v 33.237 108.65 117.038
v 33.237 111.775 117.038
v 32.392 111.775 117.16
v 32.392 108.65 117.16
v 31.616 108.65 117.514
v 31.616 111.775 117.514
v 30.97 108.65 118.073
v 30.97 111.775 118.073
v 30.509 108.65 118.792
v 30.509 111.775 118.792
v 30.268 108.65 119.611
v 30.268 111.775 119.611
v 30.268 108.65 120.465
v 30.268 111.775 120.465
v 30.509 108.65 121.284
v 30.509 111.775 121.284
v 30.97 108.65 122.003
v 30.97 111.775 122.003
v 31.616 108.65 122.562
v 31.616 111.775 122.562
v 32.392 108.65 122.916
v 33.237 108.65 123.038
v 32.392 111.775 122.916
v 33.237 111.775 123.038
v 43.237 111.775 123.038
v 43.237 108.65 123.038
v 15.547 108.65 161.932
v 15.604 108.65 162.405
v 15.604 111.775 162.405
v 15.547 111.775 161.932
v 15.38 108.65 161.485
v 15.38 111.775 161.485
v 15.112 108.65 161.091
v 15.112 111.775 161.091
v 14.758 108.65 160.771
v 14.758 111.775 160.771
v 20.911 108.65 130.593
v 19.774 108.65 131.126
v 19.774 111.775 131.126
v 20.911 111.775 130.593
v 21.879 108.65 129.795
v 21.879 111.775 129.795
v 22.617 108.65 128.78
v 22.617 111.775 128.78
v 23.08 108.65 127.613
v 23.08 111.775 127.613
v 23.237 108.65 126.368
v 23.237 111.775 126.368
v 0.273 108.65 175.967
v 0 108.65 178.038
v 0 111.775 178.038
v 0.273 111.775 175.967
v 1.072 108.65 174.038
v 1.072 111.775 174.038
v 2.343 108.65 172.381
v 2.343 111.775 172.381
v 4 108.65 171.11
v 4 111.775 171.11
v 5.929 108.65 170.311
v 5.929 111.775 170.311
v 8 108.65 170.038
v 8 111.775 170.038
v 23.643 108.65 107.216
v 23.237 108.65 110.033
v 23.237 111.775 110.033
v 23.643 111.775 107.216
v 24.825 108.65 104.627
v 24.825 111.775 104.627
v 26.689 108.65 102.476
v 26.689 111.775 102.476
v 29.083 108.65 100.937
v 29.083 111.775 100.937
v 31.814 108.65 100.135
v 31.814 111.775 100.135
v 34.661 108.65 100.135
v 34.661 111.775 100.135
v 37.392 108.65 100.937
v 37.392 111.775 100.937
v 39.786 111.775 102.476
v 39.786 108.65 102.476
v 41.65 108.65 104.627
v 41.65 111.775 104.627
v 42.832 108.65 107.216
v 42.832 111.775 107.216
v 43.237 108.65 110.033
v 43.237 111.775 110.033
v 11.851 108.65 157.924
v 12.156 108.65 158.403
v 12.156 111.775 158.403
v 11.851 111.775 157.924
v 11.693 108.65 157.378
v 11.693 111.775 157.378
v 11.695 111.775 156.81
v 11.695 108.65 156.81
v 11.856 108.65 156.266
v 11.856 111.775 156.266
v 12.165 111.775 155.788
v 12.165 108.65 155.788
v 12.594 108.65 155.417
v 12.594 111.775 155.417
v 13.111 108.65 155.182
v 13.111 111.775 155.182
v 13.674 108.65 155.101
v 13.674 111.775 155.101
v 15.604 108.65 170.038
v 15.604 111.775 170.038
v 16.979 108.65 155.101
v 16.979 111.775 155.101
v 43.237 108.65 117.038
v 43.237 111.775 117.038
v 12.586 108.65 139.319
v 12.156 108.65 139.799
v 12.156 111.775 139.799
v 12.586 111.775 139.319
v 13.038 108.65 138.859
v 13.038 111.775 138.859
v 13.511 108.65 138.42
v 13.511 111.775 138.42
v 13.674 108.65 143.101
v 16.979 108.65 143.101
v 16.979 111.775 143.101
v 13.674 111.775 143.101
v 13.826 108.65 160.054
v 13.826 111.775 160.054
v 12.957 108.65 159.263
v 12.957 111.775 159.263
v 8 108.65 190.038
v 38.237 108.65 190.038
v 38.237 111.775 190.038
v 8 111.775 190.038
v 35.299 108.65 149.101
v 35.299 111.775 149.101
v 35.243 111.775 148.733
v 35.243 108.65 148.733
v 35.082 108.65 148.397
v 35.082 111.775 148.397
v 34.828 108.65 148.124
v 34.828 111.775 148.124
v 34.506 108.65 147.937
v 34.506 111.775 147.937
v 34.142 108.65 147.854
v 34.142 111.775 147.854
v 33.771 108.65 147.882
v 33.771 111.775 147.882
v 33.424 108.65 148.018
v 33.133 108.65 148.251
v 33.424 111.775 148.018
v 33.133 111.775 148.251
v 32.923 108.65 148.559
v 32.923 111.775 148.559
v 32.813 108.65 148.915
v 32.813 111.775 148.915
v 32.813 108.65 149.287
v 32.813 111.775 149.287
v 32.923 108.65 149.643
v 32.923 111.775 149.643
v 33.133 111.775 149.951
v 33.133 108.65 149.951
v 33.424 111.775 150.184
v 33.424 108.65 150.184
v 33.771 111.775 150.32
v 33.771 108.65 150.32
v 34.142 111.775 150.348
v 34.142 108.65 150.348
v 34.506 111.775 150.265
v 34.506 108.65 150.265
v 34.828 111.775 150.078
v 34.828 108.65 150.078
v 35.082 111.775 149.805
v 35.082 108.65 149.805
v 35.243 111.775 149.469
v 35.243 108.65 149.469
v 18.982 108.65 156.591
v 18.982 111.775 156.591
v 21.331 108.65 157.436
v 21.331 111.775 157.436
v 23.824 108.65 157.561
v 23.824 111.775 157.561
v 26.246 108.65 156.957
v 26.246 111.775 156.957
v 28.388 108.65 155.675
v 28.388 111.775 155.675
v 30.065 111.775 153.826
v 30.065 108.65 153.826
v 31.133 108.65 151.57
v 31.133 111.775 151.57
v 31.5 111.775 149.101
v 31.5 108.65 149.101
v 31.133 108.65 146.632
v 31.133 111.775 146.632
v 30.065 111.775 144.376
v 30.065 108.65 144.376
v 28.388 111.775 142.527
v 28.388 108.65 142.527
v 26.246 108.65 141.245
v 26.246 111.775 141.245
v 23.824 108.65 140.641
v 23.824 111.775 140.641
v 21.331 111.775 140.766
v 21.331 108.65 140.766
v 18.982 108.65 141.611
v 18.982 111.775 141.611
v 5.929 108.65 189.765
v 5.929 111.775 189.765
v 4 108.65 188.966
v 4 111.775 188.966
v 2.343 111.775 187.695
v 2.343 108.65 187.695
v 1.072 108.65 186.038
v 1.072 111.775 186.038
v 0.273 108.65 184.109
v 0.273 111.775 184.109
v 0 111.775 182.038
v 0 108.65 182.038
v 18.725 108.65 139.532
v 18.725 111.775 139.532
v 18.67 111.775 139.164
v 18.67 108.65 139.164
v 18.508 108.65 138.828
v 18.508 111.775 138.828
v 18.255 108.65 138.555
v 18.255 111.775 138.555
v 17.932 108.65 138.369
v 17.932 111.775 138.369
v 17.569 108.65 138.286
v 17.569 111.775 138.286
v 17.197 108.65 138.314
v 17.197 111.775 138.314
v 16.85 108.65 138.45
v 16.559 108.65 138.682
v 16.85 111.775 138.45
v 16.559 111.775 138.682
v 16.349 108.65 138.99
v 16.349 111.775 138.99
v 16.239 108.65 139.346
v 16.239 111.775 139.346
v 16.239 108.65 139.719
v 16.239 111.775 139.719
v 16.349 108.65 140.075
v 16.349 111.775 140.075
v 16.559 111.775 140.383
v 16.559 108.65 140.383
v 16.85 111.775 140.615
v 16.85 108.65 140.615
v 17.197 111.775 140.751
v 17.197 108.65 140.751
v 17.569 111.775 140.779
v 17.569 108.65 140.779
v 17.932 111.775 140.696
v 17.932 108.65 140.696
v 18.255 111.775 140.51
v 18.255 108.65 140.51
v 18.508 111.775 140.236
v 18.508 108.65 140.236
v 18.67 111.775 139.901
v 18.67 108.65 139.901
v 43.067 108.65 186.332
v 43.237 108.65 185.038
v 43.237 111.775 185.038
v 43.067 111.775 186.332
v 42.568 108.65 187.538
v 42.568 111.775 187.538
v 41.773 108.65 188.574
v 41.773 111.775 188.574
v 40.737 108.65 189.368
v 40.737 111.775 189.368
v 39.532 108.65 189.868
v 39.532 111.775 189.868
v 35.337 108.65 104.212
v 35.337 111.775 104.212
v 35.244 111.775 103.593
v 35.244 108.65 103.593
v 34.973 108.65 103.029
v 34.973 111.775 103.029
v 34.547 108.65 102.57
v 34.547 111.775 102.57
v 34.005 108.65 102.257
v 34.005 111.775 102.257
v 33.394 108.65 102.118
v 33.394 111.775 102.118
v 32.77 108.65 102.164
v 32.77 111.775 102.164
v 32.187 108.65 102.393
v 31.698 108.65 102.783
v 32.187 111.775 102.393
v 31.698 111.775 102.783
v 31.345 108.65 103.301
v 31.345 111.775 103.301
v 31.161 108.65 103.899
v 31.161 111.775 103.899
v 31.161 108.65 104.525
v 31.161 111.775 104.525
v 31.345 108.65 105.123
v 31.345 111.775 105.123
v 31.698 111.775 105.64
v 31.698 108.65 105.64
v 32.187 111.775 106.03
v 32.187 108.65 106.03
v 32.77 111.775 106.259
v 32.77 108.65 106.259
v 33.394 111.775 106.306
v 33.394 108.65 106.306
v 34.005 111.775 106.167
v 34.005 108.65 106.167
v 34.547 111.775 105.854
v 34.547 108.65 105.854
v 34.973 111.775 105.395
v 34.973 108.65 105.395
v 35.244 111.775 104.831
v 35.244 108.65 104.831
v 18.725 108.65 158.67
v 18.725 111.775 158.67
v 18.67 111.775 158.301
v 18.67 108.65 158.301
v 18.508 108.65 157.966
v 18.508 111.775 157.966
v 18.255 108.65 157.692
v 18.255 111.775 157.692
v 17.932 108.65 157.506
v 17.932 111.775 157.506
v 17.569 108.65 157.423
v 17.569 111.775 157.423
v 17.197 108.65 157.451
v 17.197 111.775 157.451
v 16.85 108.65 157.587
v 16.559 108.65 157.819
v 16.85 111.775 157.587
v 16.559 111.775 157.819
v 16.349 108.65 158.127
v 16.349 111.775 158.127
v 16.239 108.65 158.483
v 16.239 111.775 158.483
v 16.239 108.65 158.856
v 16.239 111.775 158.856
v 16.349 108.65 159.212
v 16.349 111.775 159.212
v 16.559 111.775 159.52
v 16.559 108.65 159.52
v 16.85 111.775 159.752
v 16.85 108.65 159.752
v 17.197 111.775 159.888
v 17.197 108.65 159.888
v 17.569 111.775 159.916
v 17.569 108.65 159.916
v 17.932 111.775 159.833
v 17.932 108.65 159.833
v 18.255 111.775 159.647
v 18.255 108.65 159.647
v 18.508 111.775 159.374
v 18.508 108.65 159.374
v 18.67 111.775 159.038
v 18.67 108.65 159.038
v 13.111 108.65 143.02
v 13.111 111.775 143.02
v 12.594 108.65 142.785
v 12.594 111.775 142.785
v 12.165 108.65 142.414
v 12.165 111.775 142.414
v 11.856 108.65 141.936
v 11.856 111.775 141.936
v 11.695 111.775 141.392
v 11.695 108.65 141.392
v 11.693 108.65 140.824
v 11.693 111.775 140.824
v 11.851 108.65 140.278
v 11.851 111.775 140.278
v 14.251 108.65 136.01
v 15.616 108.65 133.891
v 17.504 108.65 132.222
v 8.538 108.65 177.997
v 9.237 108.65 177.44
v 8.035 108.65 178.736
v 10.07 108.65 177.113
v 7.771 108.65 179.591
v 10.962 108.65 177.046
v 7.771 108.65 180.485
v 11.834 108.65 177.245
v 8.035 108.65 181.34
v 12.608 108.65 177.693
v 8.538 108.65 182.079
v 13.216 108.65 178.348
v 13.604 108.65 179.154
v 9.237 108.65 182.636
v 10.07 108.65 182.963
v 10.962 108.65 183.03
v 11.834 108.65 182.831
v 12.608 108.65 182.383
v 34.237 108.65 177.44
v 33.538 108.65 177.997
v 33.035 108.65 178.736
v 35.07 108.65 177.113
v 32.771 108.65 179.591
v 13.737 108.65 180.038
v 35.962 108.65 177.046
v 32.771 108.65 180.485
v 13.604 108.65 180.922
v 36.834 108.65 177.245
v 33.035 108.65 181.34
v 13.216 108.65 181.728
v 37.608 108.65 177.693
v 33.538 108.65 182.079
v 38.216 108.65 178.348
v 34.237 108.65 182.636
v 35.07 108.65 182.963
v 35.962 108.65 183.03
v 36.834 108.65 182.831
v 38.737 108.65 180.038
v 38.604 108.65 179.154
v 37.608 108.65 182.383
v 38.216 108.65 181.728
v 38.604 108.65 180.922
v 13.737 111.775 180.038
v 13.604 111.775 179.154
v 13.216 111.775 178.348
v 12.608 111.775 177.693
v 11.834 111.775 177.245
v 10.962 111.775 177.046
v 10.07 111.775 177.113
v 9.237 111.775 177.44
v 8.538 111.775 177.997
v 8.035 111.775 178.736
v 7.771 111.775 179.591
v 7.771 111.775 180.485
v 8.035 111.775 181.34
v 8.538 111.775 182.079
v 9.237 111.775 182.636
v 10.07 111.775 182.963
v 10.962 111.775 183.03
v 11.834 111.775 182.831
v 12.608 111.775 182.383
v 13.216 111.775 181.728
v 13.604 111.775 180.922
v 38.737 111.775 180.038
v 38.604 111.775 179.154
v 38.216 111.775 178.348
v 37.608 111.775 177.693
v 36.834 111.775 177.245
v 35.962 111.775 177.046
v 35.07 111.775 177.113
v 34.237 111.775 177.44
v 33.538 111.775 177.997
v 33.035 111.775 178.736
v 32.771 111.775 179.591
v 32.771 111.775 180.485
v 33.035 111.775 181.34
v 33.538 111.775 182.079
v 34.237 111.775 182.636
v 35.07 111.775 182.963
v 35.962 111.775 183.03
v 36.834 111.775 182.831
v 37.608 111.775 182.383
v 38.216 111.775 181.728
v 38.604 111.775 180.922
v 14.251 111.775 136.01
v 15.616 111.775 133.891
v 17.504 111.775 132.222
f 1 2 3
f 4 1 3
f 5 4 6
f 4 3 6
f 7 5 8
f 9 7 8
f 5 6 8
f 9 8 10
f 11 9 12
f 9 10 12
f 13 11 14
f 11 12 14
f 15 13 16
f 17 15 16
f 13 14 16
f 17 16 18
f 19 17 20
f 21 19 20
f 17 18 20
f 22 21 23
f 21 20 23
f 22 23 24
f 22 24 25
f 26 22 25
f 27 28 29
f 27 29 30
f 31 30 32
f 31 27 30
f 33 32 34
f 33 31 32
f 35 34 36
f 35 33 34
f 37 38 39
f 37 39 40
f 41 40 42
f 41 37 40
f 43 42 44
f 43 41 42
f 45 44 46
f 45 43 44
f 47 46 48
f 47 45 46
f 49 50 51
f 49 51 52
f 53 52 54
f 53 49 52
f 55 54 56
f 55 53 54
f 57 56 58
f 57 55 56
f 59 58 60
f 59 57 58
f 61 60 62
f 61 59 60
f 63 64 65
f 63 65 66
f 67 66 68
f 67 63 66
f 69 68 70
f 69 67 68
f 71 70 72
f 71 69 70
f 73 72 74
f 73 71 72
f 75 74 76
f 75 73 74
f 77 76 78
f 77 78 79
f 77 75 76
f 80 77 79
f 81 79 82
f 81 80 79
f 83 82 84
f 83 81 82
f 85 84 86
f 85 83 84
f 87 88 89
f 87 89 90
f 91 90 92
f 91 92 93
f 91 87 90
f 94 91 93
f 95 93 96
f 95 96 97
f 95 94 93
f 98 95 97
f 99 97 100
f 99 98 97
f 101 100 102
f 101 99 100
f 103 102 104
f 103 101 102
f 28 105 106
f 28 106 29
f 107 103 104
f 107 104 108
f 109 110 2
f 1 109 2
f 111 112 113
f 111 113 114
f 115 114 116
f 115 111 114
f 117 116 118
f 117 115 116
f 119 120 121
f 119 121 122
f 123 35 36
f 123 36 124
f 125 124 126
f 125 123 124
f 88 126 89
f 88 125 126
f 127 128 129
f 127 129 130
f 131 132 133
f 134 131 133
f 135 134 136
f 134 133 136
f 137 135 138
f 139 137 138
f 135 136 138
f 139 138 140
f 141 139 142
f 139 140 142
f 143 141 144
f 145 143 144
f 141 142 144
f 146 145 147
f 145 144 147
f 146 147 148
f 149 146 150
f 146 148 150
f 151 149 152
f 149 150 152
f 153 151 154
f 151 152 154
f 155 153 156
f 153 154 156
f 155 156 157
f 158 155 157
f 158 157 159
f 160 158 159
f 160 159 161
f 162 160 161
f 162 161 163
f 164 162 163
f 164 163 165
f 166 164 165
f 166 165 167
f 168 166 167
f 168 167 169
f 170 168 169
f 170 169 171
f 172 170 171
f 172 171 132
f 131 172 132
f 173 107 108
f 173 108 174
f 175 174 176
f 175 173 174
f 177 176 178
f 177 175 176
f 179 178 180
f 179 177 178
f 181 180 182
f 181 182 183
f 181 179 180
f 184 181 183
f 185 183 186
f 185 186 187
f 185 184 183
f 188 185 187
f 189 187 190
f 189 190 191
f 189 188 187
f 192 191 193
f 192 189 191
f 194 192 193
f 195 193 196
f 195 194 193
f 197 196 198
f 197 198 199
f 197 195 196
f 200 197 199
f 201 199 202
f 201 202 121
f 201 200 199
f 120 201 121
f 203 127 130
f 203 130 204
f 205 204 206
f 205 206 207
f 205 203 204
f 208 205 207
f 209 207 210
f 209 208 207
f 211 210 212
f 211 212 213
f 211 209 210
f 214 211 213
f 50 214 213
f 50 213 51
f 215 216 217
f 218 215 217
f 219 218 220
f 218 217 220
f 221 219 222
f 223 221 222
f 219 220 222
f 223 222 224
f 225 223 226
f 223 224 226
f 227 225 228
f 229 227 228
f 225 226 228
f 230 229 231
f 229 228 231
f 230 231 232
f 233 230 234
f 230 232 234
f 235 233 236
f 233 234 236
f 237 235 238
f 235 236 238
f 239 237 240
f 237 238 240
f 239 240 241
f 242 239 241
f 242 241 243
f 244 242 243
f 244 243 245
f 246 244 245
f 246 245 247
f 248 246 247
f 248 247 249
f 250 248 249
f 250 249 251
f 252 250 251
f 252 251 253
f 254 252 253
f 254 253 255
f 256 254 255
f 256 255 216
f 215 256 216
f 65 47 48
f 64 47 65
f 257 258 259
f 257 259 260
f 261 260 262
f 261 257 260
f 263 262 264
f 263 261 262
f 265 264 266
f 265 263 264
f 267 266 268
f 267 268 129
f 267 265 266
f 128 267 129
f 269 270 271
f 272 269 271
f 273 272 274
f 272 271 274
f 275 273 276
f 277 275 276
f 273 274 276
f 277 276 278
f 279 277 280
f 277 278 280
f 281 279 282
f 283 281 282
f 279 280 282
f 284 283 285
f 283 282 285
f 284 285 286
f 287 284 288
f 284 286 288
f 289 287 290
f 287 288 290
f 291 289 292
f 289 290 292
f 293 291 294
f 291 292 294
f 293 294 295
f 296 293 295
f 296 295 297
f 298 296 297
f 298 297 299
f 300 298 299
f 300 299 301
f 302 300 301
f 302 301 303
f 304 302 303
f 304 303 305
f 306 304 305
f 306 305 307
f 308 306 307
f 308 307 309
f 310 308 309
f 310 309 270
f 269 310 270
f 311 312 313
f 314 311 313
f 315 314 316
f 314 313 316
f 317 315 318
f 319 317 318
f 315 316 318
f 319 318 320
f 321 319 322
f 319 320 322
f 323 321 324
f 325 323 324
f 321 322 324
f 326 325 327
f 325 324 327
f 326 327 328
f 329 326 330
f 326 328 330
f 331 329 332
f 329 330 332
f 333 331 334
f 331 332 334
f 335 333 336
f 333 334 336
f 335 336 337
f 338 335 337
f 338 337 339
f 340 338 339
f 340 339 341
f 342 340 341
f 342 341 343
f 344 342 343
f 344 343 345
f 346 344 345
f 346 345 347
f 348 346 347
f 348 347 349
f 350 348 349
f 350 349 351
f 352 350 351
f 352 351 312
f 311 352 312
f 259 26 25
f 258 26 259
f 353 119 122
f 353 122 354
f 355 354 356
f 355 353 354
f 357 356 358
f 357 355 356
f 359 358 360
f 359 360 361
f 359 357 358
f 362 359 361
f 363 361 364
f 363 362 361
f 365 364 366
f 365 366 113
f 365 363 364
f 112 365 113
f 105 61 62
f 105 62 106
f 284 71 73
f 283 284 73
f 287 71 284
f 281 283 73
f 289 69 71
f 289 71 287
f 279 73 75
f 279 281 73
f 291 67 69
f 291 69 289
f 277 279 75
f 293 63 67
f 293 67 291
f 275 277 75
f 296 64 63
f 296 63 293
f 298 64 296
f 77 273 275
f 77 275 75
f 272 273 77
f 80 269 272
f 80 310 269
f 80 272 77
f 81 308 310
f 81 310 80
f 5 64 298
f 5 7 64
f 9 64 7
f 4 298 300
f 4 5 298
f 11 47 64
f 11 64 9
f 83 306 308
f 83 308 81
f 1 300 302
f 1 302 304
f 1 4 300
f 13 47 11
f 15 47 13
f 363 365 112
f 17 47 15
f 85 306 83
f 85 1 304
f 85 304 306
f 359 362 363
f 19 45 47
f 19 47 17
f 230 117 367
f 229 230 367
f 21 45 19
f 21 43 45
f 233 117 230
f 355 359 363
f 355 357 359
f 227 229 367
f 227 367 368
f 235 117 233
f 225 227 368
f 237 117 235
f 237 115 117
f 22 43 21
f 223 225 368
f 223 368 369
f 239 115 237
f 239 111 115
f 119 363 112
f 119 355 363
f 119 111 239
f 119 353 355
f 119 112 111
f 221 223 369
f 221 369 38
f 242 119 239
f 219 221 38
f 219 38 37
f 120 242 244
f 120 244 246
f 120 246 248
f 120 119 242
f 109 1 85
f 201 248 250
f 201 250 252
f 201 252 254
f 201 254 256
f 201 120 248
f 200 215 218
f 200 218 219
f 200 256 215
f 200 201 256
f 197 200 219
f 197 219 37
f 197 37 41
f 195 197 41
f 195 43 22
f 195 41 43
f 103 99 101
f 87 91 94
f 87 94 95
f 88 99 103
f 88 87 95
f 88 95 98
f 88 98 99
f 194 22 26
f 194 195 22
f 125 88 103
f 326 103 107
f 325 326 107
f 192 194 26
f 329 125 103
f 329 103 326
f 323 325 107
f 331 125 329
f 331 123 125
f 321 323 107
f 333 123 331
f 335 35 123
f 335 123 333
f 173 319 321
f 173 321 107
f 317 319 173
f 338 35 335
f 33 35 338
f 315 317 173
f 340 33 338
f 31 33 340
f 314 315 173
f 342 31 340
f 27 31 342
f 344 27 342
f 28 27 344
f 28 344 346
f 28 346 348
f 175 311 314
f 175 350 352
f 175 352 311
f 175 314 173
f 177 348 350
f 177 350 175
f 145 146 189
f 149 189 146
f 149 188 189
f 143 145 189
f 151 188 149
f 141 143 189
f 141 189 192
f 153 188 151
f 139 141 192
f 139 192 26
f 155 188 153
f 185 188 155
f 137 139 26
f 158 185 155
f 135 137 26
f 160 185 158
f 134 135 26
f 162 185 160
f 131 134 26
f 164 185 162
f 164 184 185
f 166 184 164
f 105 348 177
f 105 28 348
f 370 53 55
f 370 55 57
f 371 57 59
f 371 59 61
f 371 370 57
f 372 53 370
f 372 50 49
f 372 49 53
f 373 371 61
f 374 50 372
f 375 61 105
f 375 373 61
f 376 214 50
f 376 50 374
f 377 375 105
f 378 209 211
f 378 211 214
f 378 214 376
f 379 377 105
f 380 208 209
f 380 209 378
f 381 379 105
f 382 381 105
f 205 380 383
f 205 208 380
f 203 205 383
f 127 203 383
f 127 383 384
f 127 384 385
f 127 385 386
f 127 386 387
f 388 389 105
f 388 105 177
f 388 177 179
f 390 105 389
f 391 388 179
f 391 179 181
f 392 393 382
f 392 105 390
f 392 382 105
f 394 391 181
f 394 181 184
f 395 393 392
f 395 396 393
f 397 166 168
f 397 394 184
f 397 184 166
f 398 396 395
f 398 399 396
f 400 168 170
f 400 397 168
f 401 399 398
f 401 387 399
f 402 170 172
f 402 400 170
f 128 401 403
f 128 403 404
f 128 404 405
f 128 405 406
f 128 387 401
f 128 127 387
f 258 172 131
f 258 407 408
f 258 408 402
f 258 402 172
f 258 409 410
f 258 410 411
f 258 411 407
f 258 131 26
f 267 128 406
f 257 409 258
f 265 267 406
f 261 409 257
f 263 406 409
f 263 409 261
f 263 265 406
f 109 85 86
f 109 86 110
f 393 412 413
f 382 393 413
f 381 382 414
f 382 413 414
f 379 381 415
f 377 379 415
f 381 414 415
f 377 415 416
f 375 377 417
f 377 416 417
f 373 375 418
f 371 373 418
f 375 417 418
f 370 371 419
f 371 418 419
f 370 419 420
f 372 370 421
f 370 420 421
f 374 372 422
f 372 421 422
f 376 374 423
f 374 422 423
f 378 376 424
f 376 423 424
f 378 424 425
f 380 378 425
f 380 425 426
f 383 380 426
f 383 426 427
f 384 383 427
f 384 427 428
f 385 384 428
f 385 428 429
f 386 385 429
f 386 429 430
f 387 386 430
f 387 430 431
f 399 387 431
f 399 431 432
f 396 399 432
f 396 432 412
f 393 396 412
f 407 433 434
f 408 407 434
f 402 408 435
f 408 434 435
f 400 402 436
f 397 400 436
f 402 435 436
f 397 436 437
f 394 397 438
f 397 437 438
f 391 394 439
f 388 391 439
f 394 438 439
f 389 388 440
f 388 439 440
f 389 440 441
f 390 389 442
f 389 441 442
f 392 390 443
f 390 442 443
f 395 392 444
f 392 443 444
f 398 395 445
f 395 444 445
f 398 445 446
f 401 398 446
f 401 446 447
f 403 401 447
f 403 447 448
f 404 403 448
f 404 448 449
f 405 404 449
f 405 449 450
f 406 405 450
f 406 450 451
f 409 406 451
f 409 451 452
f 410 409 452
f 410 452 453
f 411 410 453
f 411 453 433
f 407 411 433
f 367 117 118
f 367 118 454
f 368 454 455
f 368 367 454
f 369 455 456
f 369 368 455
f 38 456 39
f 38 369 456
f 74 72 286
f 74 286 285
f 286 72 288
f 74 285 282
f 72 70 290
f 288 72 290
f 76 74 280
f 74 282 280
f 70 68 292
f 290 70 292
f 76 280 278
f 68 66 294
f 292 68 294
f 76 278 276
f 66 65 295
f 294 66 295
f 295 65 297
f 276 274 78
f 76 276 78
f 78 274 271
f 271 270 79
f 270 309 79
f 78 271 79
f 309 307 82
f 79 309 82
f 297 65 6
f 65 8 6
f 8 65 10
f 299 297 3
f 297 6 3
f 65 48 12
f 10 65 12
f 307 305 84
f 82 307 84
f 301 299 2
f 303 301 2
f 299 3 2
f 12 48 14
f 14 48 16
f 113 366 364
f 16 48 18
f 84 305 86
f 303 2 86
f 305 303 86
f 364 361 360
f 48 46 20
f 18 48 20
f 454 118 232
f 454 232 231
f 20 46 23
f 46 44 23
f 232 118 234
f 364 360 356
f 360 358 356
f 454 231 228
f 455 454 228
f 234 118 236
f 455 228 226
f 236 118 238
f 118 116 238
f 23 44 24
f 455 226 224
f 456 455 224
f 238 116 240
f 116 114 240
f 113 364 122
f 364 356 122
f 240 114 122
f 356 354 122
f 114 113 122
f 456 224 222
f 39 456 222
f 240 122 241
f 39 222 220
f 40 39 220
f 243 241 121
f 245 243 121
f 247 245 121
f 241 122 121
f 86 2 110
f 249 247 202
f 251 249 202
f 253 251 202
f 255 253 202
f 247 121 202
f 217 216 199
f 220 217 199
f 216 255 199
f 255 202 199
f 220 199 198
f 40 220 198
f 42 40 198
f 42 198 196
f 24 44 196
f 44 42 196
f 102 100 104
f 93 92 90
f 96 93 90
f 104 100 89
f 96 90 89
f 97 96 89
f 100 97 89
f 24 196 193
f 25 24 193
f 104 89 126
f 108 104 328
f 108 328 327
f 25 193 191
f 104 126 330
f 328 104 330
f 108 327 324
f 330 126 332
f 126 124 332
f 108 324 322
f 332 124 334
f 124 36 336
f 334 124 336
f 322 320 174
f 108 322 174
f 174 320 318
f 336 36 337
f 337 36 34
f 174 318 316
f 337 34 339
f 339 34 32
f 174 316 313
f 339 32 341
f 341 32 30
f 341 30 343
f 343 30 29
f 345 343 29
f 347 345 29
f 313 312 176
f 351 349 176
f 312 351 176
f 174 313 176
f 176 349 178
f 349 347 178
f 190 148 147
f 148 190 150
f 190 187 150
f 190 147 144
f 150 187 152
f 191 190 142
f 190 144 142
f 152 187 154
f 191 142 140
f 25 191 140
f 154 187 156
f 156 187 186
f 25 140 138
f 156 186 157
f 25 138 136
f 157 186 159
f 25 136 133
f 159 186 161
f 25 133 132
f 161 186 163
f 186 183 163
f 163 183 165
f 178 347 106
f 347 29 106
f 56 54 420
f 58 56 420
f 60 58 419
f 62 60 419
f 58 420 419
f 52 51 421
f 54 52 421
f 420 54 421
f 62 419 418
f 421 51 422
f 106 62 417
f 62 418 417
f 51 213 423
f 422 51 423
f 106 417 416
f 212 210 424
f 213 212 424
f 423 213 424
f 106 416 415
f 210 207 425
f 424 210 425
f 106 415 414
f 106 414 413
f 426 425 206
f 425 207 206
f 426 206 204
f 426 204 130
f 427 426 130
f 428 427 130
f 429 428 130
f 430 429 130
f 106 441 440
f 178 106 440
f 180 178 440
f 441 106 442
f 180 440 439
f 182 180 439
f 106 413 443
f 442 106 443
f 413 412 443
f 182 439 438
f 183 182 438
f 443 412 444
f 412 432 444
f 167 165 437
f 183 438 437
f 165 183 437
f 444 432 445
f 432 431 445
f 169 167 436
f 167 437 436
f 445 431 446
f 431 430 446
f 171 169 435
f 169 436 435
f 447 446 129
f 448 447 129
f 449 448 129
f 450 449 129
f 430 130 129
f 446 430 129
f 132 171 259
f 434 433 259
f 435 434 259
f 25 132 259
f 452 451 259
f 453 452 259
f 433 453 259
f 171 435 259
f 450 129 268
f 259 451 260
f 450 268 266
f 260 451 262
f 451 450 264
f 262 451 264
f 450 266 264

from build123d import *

# Parameters (mm, degrees)
BOSS_EXTRUDE1_DEPTH        = 3.125
CUT_EXTRUDE1_DEPTH         = 195.919695848
F_6_0_6_DIAMETER_HOLE1_D   = 6
F_2_5_2_5_DIAMETER_HOLE1_D = 2.5
F_4_2_4_2_DIAMETER_HOLE1_D = 4.2


with BuildPart() as part:
    # Sketch1 → Boss-Extrude1 (new body)
    with BuildSketch(Plane.XZ.offset(-108.650350882)):
        with BuildLine():
            Line((43.23749287, 110.033281417), (43.23749287, 185.037999923))
            ThreePointArc((43.23749287, 185.037999923), (41.773026776, 188.573533829), (38.23749287, 190.037999923))
            Line((38.23749287, 190.037999923), (7.999992871, 190.037999923))
            ThreePointArc((7.999992871, 190.037999923), (2.343138621, 187.694854172), (-7.129e-06, 182.037999923))
            Line((-7.129e-06, 182.037999923), (-7.129e-06, 178.037999923))
            ThreePointArc((-7.129e-06, 178.037999923), (2.343138621, 172.381145673), (7.999992871, 170.037999923))
            Line((7.999992871, 170.037999923), (15.604000266, 170.037999923))
            Line((15.604000266, 170.037999923), (15.604000266, 162.405058673))
            ThreePointArc((15.604000266, 162.405058673), (15.379885206, 161.485149612), (14.757767585, 160.771406025))
            ThreePointArc((14.757767585, 160.771406025), (13.383453483, 159.667684666), (12.155505046, 158.40313624))
            ThreePointArc((12.155505046, 158.40313624), (11.856365467, 156.265617566), (13.673543586, 155.100999923))
            Line((13.673543586, 155.100999923), (16.979195581, 155.100999923))
            ThreePointArc((16.979195581, 155.100999923), (31.499992871, 149.100999923), (16.979195581, 143.100999923))
            Line((16.979195581, 143.100999923), (13.673543586, 143.100999923))
            ThreePointArc((13.673543586, 143.100999923), (11.856365467, 141.93638228), (12.155505046, 139.798863605))
            ThreePointArc((12.155505046, 139.798863605), (12.809817923, 139.086361098), (13.510844612, 138.419767711))
            ThreePointArc((13.510844612, 138.419767711), (15.615996699, 133.891251825), (19.774392147, 131.125954603))
            ThreePointArc((19.774392147, 131.125954603), (22.280047532, 129.310425898), (23.23749287, 126.368020113))
            Line((23.23749287, 126.368020113), (23.23749287, 110.033281417))
            ThreePointArc((23.23749287, 110.033281417), (33.23749287, 100.033281417), (43.23749287, 110.033281417))
        make_face()
    extrude(amount=-BOSS_EXTRUDE1_DEPTH)

    # Sketch2 → Cut-Extrude1 (cut, through all)
    with BuildSketch(Plane(origin=(0, 111.775350882, 0), x_dir=(-1, 0, 0), z_dir=(0, 1, 0))):
        with BuildLine():
            Line((-43.23749287, 123.037999923), (-43.23749287, 117.037999923))
            Line((-43.23749287, 117.037999923), (-33.23749287, 117.037999923))
            ThreePointArc((-33.23749287, 117.037999923), (-30.23749287, 120.037999923), (-33.23749287, 123.037999923))
            Line((-33.23749287, 123.037999923), (-43.23749287, 123.037999923))
        make_face()
    extrude(amount=-CUT_EXTRUDE1_DEPTH, mode=Mode.SUBTRACT)

    # Ø6.0 (6) Diameter Hole1 (through all)
    with Locations(Plane(origin=(0, 108.650350882, 0), x_dir=(-1, 0, 0), z_dir=(0, -1, 0))):
        with Locations((-10.73749287, -180.037999923), (-35.73749287, -180.037999923)):
            Hole(F_6_0_6_DIAMETER_HOLE1_D / 2)

    # Ø2.5 (2.5) Diameter Hole1 (through all)
    with Locations(Plane(origin=(0, 108.650350882, 0), x_dir=(-1, 0, 0), z_dir=(0, -1, 0))):
        with Locations((-34.048992871, -149.100999923), (-17.475492871, -158.669714609), (-17.475492871, -139.532285236)):
            Hole(F_2_5_2_5_DIAMETER_HOLE1_D / 2)

    # Ø4.2 (4.2) Diameter Hole1 (through all)
    with Locations(Plane(origin=(0, 108.650350882, 0), x_dir=(-1, 0, 0), z_dir=(0, -1, 0))):
        with Locations((-33.23749287, -104.211683364)):
            Hole(F_4_2_4_2_DIAMETER_HOLE1_D / 2)


solid = part.part
